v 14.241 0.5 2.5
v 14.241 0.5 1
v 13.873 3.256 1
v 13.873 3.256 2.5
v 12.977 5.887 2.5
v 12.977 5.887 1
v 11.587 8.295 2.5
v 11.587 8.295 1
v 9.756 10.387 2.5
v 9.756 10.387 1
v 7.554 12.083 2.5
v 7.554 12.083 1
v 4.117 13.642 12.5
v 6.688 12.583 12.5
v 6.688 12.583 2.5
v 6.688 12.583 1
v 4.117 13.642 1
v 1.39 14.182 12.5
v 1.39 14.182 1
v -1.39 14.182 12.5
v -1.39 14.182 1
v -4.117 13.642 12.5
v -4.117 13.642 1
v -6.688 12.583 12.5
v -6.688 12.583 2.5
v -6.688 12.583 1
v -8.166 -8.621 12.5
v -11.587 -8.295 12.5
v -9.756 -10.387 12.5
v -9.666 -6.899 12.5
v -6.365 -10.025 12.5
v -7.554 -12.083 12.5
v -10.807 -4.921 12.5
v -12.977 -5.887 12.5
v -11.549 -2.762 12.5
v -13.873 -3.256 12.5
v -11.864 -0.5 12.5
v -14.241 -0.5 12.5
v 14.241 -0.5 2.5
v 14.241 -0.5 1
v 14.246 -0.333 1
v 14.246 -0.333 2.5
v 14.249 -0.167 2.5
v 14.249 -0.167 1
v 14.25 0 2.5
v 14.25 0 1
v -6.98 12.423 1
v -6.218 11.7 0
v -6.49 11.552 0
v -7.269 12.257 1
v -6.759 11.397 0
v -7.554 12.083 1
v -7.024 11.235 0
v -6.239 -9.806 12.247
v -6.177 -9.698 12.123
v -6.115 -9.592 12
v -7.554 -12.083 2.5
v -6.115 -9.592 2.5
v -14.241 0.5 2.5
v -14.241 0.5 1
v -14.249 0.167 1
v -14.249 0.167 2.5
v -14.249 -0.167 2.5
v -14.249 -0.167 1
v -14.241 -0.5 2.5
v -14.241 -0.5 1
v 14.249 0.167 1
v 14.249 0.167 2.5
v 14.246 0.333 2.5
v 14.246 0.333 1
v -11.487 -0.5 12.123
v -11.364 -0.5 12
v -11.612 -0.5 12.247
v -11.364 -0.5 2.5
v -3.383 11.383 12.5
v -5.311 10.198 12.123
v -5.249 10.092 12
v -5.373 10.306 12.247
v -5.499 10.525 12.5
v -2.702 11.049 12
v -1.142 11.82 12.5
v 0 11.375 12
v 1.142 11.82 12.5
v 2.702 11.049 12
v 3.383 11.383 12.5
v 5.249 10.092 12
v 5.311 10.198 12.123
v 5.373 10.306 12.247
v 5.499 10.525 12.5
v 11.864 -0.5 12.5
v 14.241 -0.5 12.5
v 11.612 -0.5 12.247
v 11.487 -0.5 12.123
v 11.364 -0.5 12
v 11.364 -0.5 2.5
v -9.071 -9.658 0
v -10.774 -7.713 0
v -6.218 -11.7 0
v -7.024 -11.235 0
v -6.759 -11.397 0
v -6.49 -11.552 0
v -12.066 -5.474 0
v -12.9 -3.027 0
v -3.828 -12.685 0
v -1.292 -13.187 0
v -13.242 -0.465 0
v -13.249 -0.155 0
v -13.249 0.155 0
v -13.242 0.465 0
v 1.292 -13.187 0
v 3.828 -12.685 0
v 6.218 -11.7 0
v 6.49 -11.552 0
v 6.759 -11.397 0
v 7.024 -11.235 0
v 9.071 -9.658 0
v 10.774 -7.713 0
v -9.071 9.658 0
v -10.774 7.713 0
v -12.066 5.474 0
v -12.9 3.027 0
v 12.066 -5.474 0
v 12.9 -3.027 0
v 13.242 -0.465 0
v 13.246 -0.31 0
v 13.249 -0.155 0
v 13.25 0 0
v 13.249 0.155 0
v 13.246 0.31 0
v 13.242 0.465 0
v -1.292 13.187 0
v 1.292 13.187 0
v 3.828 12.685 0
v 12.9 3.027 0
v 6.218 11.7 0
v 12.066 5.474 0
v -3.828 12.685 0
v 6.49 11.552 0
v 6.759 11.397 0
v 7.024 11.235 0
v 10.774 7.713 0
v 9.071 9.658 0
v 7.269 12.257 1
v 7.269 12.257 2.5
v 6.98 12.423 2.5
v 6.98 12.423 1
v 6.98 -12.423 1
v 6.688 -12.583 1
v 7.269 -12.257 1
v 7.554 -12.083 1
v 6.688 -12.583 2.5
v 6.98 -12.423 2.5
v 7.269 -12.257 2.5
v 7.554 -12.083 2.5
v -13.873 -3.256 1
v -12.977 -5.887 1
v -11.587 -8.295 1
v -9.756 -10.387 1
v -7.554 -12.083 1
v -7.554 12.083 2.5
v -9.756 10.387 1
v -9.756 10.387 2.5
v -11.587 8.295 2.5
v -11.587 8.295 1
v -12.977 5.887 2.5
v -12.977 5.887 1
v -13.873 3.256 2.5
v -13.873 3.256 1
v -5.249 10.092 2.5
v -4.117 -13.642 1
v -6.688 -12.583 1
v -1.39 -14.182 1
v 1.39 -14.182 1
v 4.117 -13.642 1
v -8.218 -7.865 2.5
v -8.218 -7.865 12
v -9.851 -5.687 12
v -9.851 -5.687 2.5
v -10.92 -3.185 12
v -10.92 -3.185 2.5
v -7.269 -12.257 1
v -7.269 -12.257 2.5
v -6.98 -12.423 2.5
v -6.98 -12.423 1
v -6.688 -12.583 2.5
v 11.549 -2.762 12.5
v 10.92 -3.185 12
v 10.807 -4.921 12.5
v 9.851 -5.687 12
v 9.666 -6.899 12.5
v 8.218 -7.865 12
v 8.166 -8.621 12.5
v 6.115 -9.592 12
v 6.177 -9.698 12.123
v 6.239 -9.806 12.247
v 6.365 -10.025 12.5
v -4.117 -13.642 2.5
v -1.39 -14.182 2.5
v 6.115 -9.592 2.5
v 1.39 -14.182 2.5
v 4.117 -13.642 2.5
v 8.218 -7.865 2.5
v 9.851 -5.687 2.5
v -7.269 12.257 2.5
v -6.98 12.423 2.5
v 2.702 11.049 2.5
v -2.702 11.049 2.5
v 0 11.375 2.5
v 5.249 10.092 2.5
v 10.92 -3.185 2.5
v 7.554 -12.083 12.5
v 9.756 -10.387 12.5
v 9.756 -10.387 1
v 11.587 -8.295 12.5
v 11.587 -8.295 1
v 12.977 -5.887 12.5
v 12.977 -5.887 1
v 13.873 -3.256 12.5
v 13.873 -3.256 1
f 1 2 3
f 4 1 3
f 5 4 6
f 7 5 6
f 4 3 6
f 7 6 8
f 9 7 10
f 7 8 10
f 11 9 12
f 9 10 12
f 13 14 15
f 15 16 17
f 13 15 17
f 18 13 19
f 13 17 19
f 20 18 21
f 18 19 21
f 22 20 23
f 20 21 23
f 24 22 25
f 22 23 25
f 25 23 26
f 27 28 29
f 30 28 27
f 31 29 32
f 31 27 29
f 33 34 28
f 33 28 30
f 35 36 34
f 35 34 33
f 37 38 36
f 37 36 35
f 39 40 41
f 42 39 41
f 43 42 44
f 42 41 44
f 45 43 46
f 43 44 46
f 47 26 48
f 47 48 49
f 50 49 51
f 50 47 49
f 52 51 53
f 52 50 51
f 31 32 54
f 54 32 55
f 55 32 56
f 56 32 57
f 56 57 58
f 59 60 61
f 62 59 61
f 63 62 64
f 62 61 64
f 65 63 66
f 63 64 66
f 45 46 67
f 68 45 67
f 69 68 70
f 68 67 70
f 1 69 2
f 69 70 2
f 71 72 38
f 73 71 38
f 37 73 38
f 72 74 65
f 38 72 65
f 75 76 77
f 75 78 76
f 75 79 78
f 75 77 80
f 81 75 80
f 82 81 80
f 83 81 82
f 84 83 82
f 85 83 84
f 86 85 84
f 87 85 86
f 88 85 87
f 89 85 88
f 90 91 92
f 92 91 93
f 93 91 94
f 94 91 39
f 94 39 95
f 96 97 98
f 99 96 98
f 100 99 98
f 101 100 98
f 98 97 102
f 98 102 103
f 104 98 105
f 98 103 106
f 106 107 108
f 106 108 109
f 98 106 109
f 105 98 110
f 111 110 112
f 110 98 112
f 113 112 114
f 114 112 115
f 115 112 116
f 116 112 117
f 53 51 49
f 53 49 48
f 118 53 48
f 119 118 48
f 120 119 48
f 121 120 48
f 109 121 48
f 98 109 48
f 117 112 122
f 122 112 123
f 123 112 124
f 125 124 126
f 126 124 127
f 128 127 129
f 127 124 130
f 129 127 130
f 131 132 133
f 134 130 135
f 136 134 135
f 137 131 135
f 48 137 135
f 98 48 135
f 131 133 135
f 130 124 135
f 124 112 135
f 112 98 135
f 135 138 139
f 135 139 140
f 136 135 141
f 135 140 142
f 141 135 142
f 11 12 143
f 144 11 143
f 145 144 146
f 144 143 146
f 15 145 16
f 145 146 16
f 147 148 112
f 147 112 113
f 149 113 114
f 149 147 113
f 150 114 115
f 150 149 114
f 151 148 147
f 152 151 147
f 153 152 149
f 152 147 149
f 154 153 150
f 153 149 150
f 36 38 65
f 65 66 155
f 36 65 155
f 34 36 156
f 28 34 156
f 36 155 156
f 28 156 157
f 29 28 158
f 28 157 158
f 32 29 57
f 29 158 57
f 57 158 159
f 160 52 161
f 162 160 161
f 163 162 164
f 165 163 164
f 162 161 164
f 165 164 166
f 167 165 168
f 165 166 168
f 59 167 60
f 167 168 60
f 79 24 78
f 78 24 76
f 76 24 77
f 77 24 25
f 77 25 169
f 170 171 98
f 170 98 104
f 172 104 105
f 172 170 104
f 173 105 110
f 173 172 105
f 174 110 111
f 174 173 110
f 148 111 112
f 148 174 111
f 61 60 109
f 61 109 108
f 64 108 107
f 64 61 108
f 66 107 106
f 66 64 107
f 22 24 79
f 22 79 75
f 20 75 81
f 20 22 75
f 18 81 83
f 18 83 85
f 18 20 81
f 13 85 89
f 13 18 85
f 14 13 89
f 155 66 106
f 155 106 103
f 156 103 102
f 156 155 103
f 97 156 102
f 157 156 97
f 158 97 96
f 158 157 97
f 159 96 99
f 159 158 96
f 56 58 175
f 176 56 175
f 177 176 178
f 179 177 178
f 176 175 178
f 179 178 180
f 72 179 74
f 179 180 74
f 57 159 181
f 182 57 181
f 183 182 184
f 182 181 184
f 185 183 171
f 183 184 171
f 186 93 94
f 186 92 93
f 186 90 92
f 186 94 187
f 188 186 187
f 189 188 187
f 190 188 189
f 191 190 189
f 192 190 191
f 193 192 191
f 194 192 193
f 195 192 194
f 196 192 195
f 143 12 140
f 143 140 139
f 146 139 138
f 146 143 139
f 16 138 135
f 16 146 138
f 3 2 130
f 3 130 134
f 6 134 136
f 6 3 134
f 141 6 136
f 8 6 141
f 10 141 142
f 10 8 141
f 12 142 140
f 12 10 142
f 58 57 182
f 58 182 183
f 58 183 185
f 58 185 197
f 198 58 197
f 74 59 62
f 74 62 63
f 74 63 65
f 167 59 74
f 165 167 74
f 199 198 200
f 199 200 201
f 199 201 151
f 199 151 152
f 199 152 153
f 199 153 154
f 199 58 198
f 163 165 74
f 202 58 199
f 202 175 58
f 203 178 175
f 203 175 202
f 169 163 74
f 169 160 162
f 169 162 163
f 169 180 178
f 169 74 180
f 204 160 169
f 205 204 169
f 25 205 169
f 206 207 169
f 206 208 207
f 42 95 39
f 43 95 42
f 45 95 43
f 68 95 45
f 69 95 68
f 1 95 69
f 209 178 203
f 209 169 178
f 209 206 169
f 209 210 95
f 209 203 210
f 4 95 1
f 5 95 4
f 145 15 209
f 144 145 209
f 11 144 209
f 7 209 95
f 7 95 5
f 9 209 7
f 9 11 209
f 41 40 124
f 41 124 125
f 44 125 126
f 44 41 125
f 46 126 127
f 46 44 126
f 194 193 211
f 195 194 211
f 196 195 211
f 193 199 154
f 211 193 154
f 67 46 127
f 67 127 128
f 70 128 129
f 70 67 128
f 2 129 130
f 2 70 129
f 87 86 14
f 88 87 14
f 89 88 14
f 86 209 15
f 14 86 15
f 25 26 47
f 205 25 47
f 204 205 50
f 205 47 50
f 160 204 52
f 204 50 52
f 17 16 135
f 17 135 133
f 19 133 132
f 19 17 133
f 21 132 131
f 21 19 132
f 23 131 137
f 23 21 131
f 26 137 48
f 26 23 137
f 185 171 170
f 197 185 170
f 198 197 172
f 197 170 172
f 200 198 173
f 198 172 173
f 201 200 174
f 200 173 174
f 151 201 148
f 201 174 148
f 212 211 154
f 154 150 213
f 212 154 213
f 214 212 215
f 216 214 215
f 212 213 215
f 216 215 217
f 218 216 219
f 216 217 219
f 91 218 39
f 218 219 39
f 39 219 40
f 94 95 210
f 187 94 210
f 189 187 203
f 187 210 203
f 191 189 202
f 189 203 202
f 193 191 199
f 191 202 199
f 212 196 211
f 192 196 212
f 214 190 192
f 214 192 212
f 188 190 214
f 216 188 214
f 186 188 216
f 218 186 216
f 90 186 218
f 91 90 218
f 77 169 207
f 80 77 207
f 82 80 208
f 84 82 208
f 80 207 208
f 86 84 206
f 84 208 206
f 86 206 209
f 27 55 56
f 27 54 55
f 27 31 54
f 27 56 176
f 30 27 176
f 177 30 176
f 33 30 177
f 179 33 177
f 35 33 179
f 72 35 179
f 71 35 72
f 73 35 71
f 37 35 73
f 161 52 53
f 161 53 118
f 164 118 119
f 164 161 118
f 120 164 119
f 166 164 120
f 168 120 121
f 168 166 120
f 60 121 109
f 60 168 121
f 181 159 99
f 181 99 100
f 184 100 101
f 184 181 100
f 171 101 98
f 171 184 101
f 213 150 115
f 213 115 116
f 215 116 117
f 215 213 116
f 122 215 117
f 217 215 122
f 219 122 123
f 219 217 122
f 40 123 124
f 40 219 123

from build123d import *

# Parameters (mm, degrees)
F2_DEPTH = 12.5
F3_DEPTH = 2.5
F4_SIZE  = 0.5
F5_START = 2.5
F5_DEPTH = 22.5
F6_SIZE  = 1


with BuildPart() as f2:
    # F1 (on Top) → F2 (new body)
    with BuildSketch(Plane.XY):
        with BuildLine():
            Line((5.248990136, 10.091517604), (6.6875999824, 12.5832629502))
            ThreePointArc((6.6875999824, 12.5832629502), (0, 14.25), (-6.6875999824, 12.5832629502))
            Line((-6.6875999824, 12.5832629502), (-5.248990136, 10.091517604))
            ThreePointArc((-5.248990136, 10.091517604), (0, 11.375), (5.248990136, 10.091517604))
        make_face()
    extrude(amount=F2_DEPTH)



with BuildPart() as f2b:
    # F1 (on Top) → F2, piece 2 (new body)
    with BuildSketch(Plane.XY):
        with BuildLine():
            Line((11.3640056758, 0.5), (14.2412253686, 0.5))
            ThreePointArc((14.2412253686, 0.5), (12.3408620039, 7.125), (7.5536253862, 12.0832629502))
            Line((7.5536253862, 12.0832629502), (6.1150155398, 9.591517604))
            ThreePointArc((6.1150155398, 9.591517604), (9.851038968, 5.6875), (11.3640056758, 0.5))
        make_face()
    extrude(amount=F2_DEPTH)


with BuildPart() as f2c:
    # F1 (on Top) → F2, piece 3 (new body)
    with BuildSketch(Plane.XY):
        with BuildLine():
            ThreePointArc((7.5536253862, -12.0832629502), (12.3408620039, -7.125), (14.2412253686, -0.5))
            Line((14.2412253686, -0.5), (11.3640056758, -0.5))
            ThreePointArc((11.3640056758, -0.5), (9.851038968, -5.6875), (6.1150155398, -9.591517604))
            Line((6.1150155398, -9.591517604), (7.5536253862, -12.0832629502))
        make_face()
    extrude(amount=F2_DEPTH)


with BuildPart() as f2d:
    # F1 (on Top) → F2, piece 4 (new body)
    with BuildSketch(Plane.XY):
        with BuildLine():
            ThreePointArc((-14.2412253686, -0.5), (-12.3408620039, -7.125), (-7.5536253862, -12.0832629502))
            Line((-7.5536253862, -12.0832629502), (-6.1150155398, -9.591517604))
            ThreePointArc((-6.1150155398, -9.591517604), (-9.851038968, -5.6875), (-11.3640056758, -0.5))
            Line((-11.3640056758, -0.5), (-14.2412253686, -0.5))
        make_face()
    extrude(amount=F2_DEPTH)


with BuildPart() as f2e:
    # F1 (on Top) → F2, piece 5 (new body)
    with BuildSketch(Plane.XY):
        with BuildLine():
            Line((-6.1150155398, 9.591517604), (-7.5536253862, 12.0832629502))
            ThreePointArc((-7.5536253862, 12.0832629502), (-12.3408620039, 7.125), (-14.2412253686, 0.5))
            Line((-14.2412253686, 0.5), (-11.3640056758, 0.5))
            ThreePointArc((-11.3640056758, 0.5), (-9.851038968, 5.6875), (-6.1150155398, 9.591517604))
        make_face()
    extrude(amount=F2_DEPTH)


with BuildPart() as f2_1:
    add(f2.part)

    add(f2b.part)  # F3 merges F2b

    add(f2c.part)  # F3 merges F2c

    add(f2d.part)  # F3 merges F2d

    add(f2e.part)  # F3 merges F2e
    # F1 (on Top) → F3 (join)
    with BuildSketch(Plane.XY):
        with BuildLine():
            Line((11.3640056758, 0.5), (14.2412253686, 0.5))
            ThreePointArc((14.2412253686, 0.5), (12.3408620039, 7.125), (7.5536253862, 12.0832629502))
            Line((7.5536253862, 12.0832629502), (6.1150155398, 9.591517604))
            ThreePointArc((6.1150155398, 9.591517604), (9.851038968, 5.6875), (11.3640056758, 0.5))
        make_face()
        with BuildLine():
            Line((6.1150155398, 9.591517604), (7.5536253862, 12.0832629502))
            ThreePointArc((7.5536253862, 12.0832629502), (7.125, 12.3408620039), (6.6875999824, 12.5832629502))
            Line((6.6875999824, 12.5832629502), (5.248990136, 10.091517604))
            ThreePointArc((5.248990136, 10.091517604), (5.6875, 9.851038968), (6.1150155398, 9.591517604))
        make_face()
        with BuildLine():
            Line((5.248990136, 10.091517604), (6.6875999824, 12.5832629502))
            ThreePointArc((6.6875999824, 12.5832629502), (0, 14.25), (-6.6875999824, 12.5832629502))
            Line((-6.6875999824, 12.5832629502), (-5.248990136, 10.091517604))
            ThreePointArc((-5.248990136, 10.091517604), (0, 11.375), (5.248990136, 10.091517604))
        make_face()
        with BuildLine():
            Line((-5.248990136, 10.091517604), (-6.6875999824, 12.5832629502))
            ThreePointArc((-6.6875999824, 12.5832629502), (-7.125, 12.3408620039), (-7.5536253862, 12.0832629502))
            Line((-7.5536253862, 12.0832629502), (-6.1150155398, 9.591517604))
            ThreePointArc((-6.1150155398, 9.591517604), (-5.6875, 9.851038968), (-5.248990136, 10.091517604))
        make_face()
        with BuildLine():
            Line((-6.1150155398, 9.591517604), (-7.5536253862, 12.0832629502))
            ThreePointArc((-7.5536253862, 12.0832629502), (-12.3408620039, 7.125), (-14.2412253686, 0.5))
            Line((-14.2412253686, 0.5), (-11.3640056758, 0.5))
            ThreePointArc((-11.3640056758, 0.5), (-9.851038968, 5.6875), (-6.1150155398, 9.591517604))
        make_face()
        with BuildLine():
            Line((-11.3640056758, 0.5), (-14.2412253686, 0.5))
            ThreePointArc((-14.2412253686, 0.5), (-14.25, 0), (-14.2412253686, -0.5))
            Line((-14.2412253686, -0.5), (-11.3640056758, -0.5))
            ThreePointArc((-11.3640056758, -0.5), (-11.375, 0), (-11.3640056758, 0.5))
        make_face()
        with BuildLine():
            ThreePointArc((-14.2412253686, -0.5), (-12.3408620039, -7.125), (-7.5536253862, -12.0832629502))
            Line((-7.5536253862, -12.0832629502), (-6.1150155398, -9.591517604))
            ThreePointArc((-6.1150155398, -9.591517604), (-9.851038968, -5.6875), (-11.3640056758, -0.5))
            Line((-11.3640056758, -0.5), (-14.2412253686, -0.5))
        make_face()
        with BuildLine():
            ThreePointArc((-7.5536253862, -12.0832629502), (-7.125, -12.3408620039), (-6.6875999824, -12.5832629502))
            Line((-6.6875999824, -12.5832629502), (-5.248990136, -10.091517604))
            ThreePointArc((-5.248990136, -10.091517604), (-5.6875, -9.851038968), (-6.1150155398, -9.591517604))
            Line((-6.1150155398, -9.591517604), (-7.5536253862, -12.0832629502))
        make_face()
        with BuildLine():
            ThreePointArc((-6.6875999824, -12.5832629502), (0, -14.25), (6.6875999824, -12.5832629502))
            Line((6.6875999824, -12.5832629502), (5.248990136, -10.091517604))
            ThreePointArc((5.248990136, -10.091517604), (0, -11.375), (-5.248990136, -10.091517604))
            Line((-5.248990136, -10.091517604), (-6.6875999824, -12.5832629502))
        make_face()
        with BuildLine():
            ThreePointArc((6.6875999824, -12.5832629502), (7.125, -12.3408620039), (7.5536253862, -12.0832629502))
            Line((7.5536253862, -12.0832629502), (6.1150155398, -9.591517604))
            ThreePointArc((6.1150155398, -9.591517604), (5.6875, -9.851038968), (5.248990136, -10.091517604))
            Line((5.248990136, -10.091517604), (6.6875999824, -12.5832629502))
        make_face()
        with BuildLine():
            ThreePointArc((7.5536253862, -12.0832629502), (12.3408620039, -7.125), (14.2412253686, -0.5))
            Line((14.2412253686, -0.5), (11.3640056758, -0.5))
            ThreePointArc((11.3640056758, -0.5), (9.851038968, -5.6875), (6.1150155398, -9.591517604))
            Line((6.1150155398, -9.591517604), (7.5536253862, -12.0832629502))
        make_face()
        with BuildLine():
            ThreePointArc((14.2412253686, -0.5), (14.2478061733, -0.2500384941), (14.25, 0))
            ThreePointArc((14.25, 0), (14.2478061733, 0.2500384941), (14.2412253686, 0.5))
            Line((14.2412253686, 0.5), (11.3640056758, 0.5))
            ThreePointArc((11.3640056758, 0.5), (11.3722510868, 0.2500604303), (11.375, 0))
            ThreePointArc((11.375, 0), (11.3722510868, -0.2500604303), (11.3640056758, -0.5))
            Line((11.3640056758, -0.5), (14.2412253686, -0.5))
        make_face()
        with BuildLine():
            Line((0.8660254038, 0.5), (11.3640056758, 0.5))
            ThreePointArc((11.3640056758, 0.5), (9.851038968, 5.6875), (6.1150155398, 9.591517604))
            Line((6.1150155398, 9.591517604), (0.8660254038, 0.5))
        make_face()
        with BuildLine():
            ThreePointArc((11.375, 0), (11.3722510868, 0.2500604303), (11.3640056758, 0.5))
            Line((11.3640056758, 0.5), (0.8660254038, 0.5))
            Line((0.8660254038, 0.5), (0.5773502692, 0))
            Line((0.5773502692, 0), (0.8660254038, -0.5))
            Line((0.8660254038, -0.5), (11.3640056758, -0.5))
            ThreePointArc((11.3640056758, -0.5), (11.3722510868, -0.2500604303), (11.375, 0))
        make_face()
        with BuildLine():
            ThreePointArc((-11.3640056758, -0.5), (-9.851038968, -5.6875), (-6.1150155398, -9.591517604))
            Line((-6.1150155398, -9.591517604), (-0.8660254038, -0.5))
            Line((-0.8660254038, -0.5), (-11.3640056758, -0.5))
        make_face()
        with BuildLine():
            Line((-0.8660254038, 0.5), (-6.1150155398, 9.591517604))
            ThreePointArc((-6.1150155398, 9.591517604), (-9.851038968, 5.6875), (-11.3640056758, 0.5))
            Line((-11.3640056758, 0.5), (-0.8660254038, 0.5))
        make_face()
        with BuildLine():
            Line((0, 1), (-5.248990136, 10.091517604))
            ThreePointArc((-5.248990136, 10.091517604), (-5.6875, 9.851038968), (-6.1150155398, 9.591517604))
            Line((-6.1150155398, 9.591517604), (-0.8660254038, 0.5))
            Line((-0.8660254038, 0.5), (-0.2886751346, 0.5))
            Line((-0.2886751346, 0.5), (0, 1))
        make_face()
        with BuildLine():
            Line((0, 1), (5.248990136, 10.091517604))
            ThreePointArc((5.248990136, 10.091517604), (0, 11.375), (-5.248990136, 10.091517604))
            Line((-5.248990136, 10.091517604), (0, 1))
        make_face()
        with BuildLine():
            Line((0.8660254038, 0.5), (6.1150155398, 9.591517604))
            ThreePointArc((6.1150155398, 9.591517604), (5.6875, 9.851038968), (5.248990136, 10.091517604))
            Line((5.248990136, 10.091517604), (0, 1))
            Line((0, 1), (0.2886751346, 0.5))
            Line((0.2886751346, 0.5), (0.8660254038, 0.5))
        make_face()
        with BuildLine():
            ThreePointArc((5.248990136, -10.091517604), (5.6875, -9.851038968), (6.1150155398, -9.591517604))
            Line((6.1150155398, -9.591517604), (0.8660254038, -0.5))
            Line((0.8660254038, -0.5), (0.2886751346, -0.5))
            Line((0.2886751346, -0.5), (0, -1))
            Line((0, -1), (5.248990136, -10.091517604))
        make_face()
        with BuildLine():
            ThreePointArc((6.1150155398, -9.591517604), (9.851038968, -5.6875), (11.3640056758, -0.5))
            Line((11.3640056758, -0.5), (0.8660254038, -0.5))
            Line((0.8660254038, -0.5), (6.1150155398, -9.591517604))
        make_face()
        with BuildLine():
            ThreePointArc((-5.248990136, -10.091517604), (0, -11.375), (5.248990136, -10.091517604))
            Line((5.248990136, -10.091517604), (0, -1))
            Line((0, -1), (-5.248990136, -10.091517604))
        make_face()
        with BuildLine():
            ThreePointArc((-6.1150155398, -9.591517604), (-5.6875, -9.851038968), (-5.248990136, -10.091517604))
            Line((-5.248990136, -10.091517604), (0, -1))
            Line((0, -1), (-0.2886751346, -0.5))
            Line((-0.2886751346, -0.5), (-0.8660254038, -0.5))
            Line((-0.8660254038, -0.5), (-6.1150155398, -9.591517604))
        make_face()
        Polygon((0.5773502692, 0), (0.2886751346, 0.5), (-0.2886751346, 0.5), (-0.5773502692, 0), (-0.2886751346, -0.5), (0.2886751346, -0.5), align=None)
        with BuildLine():
            Line((-0.5773502692, 0), (-0.8660254038, 0.5))
            Line((-0.8660254038, 0.5), (-11.3640056758, 0.5))
            ThreePointArc((-11.3640056758, 0.5), (-11.375, 0), (-11.3640056758, -0.5))
            Line((-11.3640056758, -0.5), (-0.8660254038, -0.5))
            Line((-0.8660254038, -0.5), (-0.5773502692, 0))
        make_face()
        Polygon((0, -1), (0.2886751346, -0.5), (-0.2886751346, -0.5), align=None)
        Polygon((-0.8660254038, -0.5), (-0.2886751346, -0.5), (-0.5773502692, 0), align=None)
        Polygon((-0.5773502692, 0), (-0.2886751346, 0.5), (-0.8660254038, 0.5), align=None)
        Polygon((-0.2886751346, 0.5), (0.2886751346, 0.5), (0, 1), align=None)
        Polygon((0.5773502692, 0), (0.8660254038, 0.5), (0.2886751346, 0.5), align=None)
        Polygon((0.2886751346, -0.5), (0.8660254038, -0.5), (0.5773502692, 0), align=None)
    extrude(amount=F3_DEPTH)

    # F4
    f4_edges = [f2_1.edges().sort_by_distance(p)[0] for p in [
        (0, 11.375, 12.5),
        (9.851039, 5.6875, 12.5),
        (9.851039, -5.6875, 12.5),
        (-9.851039, -5.6875, 12.5),
        (-9.851039, 5.6875, 12.5),
    ]]
    chamfer(f4_edges, length=F4_SIZE)

    # F1 (on Top) → F5 (cut)
    with BuildSketch(Plane.XY.offset(F5_START)):
        with BuildLine():
            ThreePointArc((-14.2412253686, -0.5), (-14.25, 0), (-14.2412253686, 0.5))
            Line((-14.2412253686, 0.5), (-17.5, 0.5))
            Line((-17.5, 0.5), (-17.5, -0.5))
            Line((-17.5, -0.5), (-14.2412253686, -0.5))
        make_face()
        with BuildLine():
            Line((11.3640056758, 0.5), (14.2412253686, 0.5))
            ThreePointArc((14.2412253686, 0.5), (12.3408620039, 7.125), (7.5536253862, 12.0832629502))
            Line((7.5536253862, 12.0832629502), (6.1150155398, 9.591517604))
            ThreePointArc((6.1150155398, 9.591517604), (9.851038968, 5.6875), (11.3640056758, 0.5))
        make_face()
        with BuildLine():
            Line((0.8660254038, 0.5), (11.3640056758, 0.5))
            ThreePointArc((11.3640056758, 0.5), (9.851038968, 5.6875), (6.1150155398, 9.591517604))
            Line((6.1150155398, 9.591517604), (0.8660254038, 0.5))
        make_face()
        with BuildLine():
            Line((-6.1150155398, 9.591517604), (-7.5536253862, 12.0832629502))
            ThreePointArc((-7.5536253862, 12.0832629502), (-12.3408620039, 7.125), (-14.2412253686, 0.5))
            Line((-14.2412253686, 0.5), (-11.3640056758, 0.5))
            ThreePointArc((-11.3640056758, 0.5), (-9.851038968, 5.6875), (-6.1150155398, 9.591517604))
        make_face()
        with BuildLine():
            ThreePointArc((14.2412253686, 0.5), (14.2478061733, 0.2500384941), (14.25, 0))
            ThreePointArc((14.25, 0), (14.2478061733, -0.2500384941), (14.2412253686, -0.5))
            Line((14.2412253686, -0.5), (17.5, -0.5))
            Line((17.5, -0.5), (17.5, 0.5))
            Line((17.5, 0.5), (14.2412253686, 0.5))
        make_face()
    extrude(amount=F5_DEPTH, mode=Mode.SUBTRACT)

    # F6
    f6_edges = [f2_1.edges().sort_by_distance(p)[0] for p in [
        (12.083263, 7.553625, 0),
        (-12.340862, 7.125, 0),
        (-12.340862, -7.125, 0),
        (-14.25, 0, 0),
        (0, -14.25, 0),
    ]]
    chamfer(f6_edges, length=F6_SIZE)


solid = f2_1.part
